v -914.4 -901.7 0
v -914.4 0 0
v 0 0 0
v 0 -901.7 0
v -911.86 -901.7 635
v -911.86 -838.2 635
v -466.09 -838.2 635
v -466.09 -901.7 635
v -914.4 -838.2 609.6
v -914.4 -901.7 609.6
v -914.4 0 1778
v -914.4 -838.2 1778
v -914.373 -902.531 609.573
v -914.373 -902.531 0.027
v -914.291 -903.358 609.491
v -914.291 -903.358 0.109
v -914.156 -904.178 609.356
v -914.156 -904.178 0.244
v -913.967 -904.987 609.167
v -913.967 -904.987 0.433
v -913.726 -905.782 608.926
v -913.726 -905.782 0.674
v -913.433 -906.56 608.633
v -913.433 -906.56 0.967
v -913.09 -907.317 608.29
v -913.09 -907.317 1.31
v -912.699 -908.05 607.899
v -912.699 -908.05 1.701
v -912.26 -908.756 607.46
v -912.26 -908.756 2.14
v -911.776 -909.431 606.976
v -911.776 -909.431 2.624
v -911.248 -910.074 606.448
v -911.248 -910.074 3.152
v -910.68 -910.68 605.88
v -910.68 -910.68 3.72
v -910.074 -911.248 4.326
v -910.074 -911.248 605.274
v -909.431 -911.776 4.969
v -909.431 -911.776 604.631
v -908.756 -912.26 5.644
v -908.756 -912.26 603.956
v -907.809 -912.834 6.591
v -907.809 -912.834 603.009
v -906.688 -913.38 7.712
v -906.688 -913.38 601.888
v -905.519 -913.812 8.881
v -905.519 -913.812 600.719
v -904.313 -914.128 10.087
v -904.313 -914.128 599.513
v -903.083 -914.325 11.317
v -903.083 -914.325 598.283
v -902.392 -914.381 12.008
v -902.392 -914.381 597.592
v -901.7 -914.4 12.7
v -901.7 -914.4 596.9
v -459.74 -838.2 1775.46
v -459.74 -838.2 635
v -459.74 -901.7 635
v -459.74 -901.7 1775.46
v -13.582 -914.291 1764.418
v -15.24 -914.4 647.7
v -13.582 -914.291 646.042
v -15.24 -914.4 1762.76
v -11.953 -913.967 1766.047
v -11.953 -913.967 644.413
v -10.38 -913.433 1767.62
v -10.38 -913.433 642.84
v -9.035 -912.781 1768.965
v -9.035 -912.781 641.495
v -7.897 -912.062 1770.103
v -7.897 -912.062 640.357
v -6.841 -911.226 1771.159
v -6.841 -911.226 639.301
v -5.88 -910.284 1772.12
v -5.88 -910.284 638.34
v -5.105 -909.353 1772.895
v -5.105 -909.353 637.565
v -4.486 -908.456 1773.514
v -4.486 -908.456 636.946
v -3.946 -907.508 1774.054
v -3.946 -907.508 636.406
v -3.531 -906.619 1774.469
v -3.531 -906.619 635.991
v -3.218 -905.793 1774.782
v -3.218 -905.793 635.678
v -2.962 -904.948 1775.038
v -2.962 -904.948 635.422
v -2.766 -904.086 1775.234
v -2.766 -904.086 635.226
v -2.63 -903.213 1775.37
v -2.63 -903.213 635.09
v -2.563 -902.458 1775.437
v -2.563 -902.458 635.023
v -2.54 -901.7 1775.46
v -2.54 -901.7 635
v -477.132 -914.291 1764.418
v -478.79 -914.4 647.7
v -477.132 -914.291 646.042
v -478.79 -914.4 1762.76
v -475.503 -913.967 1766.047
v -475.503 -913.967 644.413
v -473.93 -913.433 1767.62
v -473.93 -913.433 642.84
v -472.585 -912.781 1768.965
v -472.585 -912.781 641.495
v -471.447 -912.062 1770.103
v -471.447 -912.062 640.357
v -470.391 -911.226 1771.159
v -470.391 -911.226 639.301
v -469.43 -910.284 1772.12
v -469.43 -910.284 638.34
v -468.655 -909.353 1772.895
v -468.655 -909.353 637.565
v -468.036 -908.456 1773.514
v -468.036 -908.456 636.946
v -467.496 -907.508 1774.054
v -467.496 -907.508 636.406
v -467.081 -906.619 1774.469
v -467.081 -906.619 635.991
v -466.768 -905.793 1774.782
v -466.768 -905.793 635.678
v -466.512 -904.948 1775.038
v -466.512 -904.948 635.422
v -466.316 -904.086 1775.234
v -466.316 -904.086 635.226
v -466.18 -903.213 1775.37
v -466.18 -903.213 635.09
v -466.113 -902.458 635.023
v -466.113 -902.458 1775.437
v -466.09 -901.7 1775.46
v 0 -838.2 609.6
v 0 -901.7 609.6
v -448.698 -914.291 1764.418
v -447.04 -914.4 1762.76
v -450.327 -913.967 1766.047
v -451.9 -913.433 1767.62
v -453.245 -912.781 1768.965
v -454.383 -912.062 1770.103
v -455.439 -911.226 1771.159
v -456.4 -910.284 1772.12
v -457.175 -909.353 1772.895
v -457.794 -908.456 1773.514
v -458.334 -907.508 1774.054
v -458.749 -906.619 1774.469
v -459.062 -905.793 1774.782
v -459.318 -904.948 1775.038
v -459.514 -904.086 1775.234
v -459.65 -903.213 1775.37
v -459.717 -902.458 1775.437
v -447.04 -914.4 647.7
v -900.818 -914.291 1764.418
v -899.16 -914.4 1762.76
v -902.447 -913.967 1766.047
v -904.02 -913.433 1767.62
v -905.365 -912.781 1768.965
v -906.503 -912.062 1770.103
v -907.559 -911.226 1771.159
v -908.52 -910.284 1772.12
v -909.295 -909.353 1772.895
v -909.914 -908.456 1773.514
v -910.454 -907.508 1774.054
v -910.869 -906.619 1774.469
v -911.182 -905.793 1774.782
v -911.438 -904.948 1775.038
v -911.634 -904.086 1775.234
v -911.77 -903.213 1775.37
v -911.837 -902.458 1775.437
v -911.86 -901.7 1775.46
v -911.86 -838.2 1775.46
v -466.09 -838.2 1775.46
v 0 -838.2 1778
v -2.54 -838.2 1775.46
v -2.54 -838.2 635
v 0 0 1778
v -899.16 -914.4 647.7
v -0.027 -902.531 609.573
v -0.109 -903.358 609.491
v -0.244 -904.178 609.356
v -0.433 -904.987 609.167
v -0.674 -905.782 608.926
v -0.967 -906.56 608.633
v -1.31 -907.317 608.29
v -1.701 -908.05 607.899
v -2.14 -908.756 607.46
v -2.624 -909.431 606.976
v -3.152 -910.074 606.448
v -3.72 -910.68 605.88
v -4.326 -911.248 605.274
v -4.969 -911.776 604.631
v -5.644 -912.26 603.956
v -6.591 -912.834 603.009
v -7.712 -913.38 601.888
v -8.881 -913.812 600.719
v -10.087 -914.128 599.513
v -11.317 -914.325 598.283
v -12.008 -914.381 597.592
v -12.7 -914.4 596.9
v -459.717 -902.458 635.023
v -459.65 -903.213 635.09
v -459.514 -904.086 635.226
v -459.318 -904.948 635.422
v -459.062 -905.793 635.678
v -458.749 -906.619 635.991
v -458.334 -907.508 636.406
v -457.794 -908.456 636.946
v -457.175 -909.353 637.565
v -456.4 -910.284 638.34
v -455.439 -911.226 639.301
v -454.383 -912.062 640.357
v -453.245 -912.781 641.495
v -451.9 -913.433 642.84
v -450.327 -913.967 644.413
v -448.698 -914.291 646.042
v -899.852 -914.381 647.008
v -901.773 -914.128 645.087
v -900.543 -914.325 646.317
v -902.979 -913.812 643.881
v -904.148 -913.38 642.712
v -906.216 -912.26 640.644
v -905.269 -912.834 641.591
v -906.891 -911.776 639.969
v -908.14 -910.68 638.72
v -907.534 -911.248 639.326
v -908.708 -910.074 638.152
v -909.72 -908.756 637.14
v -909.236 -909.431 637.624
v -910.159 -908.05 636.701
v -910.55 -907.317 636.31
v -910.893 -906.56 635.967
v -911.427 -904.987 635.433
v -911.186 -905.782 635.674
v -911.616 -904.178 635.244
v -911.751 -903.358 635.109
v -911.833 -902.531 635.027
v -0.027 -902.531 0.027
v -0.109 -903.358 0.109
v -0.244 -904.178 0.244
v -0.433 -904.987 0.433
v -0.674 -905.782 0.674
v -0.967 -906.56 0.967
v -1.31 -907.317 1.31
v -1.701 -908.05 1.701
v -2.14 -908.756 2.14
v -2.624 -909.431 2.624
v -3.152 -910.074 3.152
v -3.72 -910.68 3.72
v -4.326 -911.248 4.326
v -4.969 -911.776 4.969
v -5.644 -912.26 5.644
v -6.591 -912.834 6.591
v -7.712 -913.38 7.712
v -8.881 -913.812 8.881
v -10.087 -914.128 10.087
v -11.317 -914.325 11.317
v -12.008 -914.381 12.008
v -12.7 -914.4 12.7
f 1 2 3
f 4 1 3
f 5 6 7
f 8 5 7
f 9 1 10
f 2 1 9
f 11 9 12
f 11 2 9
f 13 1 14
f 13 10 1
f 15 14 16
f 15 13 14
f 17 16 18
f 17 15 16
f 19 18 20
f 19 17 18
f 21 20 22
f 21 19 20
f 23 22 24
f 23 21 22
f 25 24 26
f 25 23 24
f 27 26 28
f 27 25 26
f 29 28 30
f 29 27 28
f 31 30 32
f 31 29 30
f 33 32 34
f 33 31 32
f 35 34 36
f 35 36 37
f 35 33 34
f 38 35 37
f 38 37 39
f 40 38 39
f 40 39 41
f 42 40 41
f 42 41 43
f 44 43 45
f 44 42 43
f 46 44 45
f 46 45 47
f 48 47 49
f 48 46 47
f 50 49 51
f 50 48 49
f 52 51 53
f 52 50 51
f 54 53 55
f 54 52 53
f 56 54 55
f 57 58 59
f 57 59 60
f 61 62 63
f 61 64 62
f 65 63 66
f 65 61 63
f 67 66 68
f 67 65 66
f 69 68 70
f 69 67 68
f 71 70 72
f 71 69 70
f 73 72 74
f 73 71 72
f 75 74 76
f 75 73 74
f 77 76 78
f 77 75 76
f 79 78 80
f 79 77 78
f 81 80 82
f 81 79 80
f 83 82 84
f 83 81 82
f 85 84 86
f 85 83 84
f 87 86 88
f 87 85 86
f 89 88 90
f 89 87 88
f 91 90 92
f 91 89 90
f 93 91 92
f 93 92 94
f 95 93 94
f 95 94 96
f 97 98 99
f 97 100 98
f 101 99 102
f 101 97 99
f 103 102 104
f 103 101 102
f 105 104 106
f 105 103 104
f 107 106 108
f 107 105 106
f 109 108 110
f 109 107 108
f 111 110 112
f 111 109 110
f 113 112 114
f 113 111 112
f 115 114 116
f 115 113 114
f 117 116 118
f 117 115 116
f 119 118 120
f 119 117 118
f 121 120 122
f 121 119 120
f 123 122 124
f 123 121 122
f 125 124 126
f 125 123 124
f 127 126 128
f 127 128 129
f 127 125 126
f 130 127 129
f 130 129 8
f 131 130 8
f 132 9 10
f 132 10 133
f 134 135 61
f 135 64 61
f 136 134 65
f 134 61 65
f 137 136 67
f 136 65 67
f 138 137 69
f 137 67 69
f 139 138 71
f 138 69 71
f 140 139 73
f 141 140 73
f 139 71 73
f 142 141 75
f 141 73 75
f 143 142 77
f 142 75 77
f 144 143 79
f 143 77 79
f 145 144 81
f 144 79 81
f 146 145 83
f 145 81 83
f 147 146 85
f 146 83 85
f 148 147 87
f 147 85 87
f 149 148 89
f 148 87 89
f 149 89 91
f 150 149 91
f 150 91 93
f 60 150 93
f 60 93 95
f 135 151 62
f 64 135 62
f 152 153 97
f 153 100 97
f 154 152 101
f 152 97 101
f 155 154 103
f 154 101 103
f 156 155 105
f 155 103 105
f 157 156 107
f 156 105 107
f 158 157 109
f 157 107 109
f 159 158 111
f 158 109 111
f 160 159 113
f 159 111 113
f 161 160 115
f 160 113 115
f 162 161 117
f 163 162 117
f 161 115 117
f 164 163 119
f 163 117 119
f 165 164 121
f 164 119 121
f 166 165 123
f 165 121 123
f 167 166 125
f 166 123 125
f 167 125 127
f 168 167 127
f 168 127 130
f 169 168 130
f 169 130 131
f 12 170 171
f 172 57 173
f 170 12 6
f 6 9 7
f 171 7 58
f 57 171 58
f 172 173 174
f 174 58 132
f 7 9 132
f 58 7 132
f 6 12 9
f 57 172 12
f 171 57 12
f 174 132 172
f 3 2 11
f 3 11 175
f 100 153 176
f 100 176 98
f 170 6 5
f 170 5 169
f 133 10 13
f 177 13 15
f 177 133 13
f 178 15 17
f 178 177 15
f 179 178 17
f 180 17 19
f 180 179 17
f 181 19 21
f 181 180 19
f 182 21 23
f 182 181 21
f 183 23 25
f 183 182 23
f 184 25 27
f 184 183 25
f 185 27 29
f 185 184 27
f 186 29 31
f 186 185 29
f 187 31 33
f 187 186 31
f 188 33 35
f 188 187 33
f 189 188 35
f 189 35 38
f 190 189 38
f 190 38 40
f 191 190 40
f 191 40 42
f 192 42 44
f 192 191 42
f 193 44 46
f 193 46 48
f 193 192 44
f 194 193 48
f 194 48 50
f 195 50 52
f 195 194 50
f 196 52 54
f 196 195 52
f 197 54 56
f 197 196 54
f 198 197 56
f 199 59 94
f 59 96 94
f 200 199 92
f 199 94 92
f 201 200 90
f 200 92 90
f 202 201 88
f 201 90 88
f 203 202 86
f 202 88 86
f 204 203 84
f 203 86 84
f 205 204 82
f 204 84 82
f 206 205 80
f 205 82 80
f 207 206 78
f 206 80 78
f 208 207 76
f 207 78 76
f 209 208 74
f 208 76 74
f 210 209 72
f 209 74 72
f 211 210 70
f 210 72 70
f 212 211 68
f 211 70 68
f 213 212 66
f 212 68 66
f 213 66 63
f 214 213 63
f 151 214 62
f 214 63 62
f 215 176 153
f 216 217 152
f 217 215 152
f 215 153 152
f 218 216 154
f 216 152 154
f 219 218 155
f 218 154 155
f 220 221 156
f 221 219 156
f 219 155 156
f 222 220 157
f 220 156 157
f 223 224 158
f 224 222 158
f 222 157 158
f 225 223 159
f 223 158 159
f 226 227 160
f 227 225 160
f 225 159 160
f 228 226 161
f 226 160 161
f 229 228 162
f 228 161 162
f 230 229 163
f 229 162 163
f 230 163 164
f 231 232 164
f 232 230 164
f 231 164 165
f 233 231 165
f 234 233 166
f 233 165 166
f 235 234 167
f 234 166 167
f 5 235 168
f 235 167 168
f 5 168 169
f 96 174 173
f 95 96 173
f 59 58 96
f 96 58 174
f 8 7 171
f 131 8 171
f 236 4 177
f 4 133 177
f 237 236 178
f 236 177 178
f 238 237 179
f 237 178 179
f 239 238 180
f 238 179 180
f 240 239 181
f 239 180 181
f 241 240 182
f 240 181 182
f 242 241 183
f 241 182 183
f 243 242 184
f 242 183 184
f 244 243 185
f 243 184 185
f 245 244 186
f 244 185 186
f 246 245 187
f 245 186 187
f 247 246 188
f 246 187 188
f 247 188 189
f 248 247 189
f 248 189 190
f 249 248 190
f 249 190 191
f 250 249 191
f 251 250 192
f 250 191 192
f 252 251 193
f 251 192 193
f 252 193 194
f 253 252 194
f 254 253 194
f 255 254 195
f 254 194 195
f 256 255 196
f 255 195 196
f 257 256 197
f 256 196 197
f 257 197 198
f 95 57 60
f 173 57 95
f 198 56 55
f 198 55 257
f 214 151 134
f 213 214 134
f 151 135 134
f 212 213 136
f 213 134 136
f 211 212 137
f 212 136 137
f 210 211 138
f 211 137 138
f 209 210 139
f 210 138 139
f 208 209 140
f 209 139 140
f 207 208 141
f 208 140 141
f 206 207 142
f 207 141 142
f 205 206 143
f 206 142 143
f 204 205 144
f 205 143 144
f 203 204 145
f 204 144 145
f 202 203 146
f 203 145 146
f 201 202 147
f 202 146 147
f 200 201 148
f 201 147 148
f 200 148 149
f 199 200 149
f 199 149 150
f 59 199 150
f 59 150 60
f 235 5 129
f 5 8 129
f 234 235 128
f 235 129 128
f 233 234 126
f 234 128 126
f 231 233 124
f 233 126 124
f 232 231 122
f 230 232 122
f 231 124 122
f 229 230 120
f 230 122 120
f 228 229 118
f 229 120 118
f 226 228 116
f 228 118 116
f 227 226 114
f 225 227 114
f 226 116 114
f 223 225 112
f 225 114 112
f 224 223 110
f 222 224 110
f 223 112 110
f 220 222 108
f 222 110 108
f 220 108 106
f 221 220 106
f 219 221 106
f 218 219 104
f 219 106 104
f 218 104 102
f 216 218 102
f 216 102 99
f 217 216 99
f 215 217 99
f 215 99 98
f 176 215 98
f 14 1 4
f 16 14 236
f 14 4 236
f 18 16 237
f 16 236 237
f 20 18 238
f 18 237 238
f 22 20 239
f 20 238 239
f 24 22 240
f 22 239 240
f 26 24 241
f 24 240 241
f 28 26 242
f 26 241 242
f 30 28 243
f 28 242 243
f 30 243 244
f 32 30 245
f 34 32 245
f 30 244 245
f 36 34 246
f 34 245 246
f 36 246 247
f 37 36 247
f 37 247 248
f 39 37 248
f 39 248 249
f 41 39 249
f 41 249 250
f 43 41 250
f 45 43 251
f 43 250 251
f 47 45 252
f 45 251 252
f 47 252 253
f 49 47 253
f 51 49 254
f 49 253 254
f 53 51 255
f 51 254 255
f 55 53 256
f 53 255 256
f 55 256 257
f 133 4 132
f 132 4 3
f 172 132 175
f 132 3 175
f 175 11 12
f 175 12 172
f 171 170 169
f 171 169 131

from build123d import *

# Parameters (mm, degrees)
F0_W     = 914.4
F0_H     = 838.2
F1_DEPTH = 1778
F2_W     = 914.4
F2_H     = 609.6
F2_W_2   = 445.77
F2_H_2   = 1140.46
F2_W_3   = 457.2
F3_DEPTH = 76.2
F4_R     = 12.7


with BuildPart() as f1:
    # F0 (on Top) → F1 (new body)
    with BuildSketch(Plane.XY):
        with Locations((-457.2, -419.1)):
            Rectangle(F0_W, F0_H)
    extrude(amount=F1_DEPTH)

    # F2 (on face) → F3 (join)
    with BuildSketch(Plane.XZ.offset(838.2)):
        with Locations((-457.2, 304.8)):
            Rectangle(F2_W, F2_H)
        with Locations((-688.975, 1205.23)):
            Rectangle(F2_W_2, F2_H_2)
        with Locations((-231.14, 1205.23)):
            Rectangle(F2_W_3, F2_H_2)
    extrude(amount=F3_DEPTH)

    # F4
    f4_edges = [f1.edges().sort_by_distance(p)[0] for p in [
        (-688.975, -914.4, 1775.46),
        (-466.09, -914.4, 1205.23),
        (-459.74, -914.4, 1205.23),
        (-231.14, -914.4, 1775.46),
        (-2.54, -914.4, 1205.23),
        (-231.14, -914.4, 635),
        (-688.975, -914.4, 635),
        (-911.86, -914.4, 1205.23),
        (-457.2, -914.4, 609.6),
        (-914.4, -914.4, 304.8),
        (-457.2, -914.4, 0),
        (0, -914.4, 304.8),
    ]]
    fillet(f4_edges, radius=F4_R)


solid = f1.part
